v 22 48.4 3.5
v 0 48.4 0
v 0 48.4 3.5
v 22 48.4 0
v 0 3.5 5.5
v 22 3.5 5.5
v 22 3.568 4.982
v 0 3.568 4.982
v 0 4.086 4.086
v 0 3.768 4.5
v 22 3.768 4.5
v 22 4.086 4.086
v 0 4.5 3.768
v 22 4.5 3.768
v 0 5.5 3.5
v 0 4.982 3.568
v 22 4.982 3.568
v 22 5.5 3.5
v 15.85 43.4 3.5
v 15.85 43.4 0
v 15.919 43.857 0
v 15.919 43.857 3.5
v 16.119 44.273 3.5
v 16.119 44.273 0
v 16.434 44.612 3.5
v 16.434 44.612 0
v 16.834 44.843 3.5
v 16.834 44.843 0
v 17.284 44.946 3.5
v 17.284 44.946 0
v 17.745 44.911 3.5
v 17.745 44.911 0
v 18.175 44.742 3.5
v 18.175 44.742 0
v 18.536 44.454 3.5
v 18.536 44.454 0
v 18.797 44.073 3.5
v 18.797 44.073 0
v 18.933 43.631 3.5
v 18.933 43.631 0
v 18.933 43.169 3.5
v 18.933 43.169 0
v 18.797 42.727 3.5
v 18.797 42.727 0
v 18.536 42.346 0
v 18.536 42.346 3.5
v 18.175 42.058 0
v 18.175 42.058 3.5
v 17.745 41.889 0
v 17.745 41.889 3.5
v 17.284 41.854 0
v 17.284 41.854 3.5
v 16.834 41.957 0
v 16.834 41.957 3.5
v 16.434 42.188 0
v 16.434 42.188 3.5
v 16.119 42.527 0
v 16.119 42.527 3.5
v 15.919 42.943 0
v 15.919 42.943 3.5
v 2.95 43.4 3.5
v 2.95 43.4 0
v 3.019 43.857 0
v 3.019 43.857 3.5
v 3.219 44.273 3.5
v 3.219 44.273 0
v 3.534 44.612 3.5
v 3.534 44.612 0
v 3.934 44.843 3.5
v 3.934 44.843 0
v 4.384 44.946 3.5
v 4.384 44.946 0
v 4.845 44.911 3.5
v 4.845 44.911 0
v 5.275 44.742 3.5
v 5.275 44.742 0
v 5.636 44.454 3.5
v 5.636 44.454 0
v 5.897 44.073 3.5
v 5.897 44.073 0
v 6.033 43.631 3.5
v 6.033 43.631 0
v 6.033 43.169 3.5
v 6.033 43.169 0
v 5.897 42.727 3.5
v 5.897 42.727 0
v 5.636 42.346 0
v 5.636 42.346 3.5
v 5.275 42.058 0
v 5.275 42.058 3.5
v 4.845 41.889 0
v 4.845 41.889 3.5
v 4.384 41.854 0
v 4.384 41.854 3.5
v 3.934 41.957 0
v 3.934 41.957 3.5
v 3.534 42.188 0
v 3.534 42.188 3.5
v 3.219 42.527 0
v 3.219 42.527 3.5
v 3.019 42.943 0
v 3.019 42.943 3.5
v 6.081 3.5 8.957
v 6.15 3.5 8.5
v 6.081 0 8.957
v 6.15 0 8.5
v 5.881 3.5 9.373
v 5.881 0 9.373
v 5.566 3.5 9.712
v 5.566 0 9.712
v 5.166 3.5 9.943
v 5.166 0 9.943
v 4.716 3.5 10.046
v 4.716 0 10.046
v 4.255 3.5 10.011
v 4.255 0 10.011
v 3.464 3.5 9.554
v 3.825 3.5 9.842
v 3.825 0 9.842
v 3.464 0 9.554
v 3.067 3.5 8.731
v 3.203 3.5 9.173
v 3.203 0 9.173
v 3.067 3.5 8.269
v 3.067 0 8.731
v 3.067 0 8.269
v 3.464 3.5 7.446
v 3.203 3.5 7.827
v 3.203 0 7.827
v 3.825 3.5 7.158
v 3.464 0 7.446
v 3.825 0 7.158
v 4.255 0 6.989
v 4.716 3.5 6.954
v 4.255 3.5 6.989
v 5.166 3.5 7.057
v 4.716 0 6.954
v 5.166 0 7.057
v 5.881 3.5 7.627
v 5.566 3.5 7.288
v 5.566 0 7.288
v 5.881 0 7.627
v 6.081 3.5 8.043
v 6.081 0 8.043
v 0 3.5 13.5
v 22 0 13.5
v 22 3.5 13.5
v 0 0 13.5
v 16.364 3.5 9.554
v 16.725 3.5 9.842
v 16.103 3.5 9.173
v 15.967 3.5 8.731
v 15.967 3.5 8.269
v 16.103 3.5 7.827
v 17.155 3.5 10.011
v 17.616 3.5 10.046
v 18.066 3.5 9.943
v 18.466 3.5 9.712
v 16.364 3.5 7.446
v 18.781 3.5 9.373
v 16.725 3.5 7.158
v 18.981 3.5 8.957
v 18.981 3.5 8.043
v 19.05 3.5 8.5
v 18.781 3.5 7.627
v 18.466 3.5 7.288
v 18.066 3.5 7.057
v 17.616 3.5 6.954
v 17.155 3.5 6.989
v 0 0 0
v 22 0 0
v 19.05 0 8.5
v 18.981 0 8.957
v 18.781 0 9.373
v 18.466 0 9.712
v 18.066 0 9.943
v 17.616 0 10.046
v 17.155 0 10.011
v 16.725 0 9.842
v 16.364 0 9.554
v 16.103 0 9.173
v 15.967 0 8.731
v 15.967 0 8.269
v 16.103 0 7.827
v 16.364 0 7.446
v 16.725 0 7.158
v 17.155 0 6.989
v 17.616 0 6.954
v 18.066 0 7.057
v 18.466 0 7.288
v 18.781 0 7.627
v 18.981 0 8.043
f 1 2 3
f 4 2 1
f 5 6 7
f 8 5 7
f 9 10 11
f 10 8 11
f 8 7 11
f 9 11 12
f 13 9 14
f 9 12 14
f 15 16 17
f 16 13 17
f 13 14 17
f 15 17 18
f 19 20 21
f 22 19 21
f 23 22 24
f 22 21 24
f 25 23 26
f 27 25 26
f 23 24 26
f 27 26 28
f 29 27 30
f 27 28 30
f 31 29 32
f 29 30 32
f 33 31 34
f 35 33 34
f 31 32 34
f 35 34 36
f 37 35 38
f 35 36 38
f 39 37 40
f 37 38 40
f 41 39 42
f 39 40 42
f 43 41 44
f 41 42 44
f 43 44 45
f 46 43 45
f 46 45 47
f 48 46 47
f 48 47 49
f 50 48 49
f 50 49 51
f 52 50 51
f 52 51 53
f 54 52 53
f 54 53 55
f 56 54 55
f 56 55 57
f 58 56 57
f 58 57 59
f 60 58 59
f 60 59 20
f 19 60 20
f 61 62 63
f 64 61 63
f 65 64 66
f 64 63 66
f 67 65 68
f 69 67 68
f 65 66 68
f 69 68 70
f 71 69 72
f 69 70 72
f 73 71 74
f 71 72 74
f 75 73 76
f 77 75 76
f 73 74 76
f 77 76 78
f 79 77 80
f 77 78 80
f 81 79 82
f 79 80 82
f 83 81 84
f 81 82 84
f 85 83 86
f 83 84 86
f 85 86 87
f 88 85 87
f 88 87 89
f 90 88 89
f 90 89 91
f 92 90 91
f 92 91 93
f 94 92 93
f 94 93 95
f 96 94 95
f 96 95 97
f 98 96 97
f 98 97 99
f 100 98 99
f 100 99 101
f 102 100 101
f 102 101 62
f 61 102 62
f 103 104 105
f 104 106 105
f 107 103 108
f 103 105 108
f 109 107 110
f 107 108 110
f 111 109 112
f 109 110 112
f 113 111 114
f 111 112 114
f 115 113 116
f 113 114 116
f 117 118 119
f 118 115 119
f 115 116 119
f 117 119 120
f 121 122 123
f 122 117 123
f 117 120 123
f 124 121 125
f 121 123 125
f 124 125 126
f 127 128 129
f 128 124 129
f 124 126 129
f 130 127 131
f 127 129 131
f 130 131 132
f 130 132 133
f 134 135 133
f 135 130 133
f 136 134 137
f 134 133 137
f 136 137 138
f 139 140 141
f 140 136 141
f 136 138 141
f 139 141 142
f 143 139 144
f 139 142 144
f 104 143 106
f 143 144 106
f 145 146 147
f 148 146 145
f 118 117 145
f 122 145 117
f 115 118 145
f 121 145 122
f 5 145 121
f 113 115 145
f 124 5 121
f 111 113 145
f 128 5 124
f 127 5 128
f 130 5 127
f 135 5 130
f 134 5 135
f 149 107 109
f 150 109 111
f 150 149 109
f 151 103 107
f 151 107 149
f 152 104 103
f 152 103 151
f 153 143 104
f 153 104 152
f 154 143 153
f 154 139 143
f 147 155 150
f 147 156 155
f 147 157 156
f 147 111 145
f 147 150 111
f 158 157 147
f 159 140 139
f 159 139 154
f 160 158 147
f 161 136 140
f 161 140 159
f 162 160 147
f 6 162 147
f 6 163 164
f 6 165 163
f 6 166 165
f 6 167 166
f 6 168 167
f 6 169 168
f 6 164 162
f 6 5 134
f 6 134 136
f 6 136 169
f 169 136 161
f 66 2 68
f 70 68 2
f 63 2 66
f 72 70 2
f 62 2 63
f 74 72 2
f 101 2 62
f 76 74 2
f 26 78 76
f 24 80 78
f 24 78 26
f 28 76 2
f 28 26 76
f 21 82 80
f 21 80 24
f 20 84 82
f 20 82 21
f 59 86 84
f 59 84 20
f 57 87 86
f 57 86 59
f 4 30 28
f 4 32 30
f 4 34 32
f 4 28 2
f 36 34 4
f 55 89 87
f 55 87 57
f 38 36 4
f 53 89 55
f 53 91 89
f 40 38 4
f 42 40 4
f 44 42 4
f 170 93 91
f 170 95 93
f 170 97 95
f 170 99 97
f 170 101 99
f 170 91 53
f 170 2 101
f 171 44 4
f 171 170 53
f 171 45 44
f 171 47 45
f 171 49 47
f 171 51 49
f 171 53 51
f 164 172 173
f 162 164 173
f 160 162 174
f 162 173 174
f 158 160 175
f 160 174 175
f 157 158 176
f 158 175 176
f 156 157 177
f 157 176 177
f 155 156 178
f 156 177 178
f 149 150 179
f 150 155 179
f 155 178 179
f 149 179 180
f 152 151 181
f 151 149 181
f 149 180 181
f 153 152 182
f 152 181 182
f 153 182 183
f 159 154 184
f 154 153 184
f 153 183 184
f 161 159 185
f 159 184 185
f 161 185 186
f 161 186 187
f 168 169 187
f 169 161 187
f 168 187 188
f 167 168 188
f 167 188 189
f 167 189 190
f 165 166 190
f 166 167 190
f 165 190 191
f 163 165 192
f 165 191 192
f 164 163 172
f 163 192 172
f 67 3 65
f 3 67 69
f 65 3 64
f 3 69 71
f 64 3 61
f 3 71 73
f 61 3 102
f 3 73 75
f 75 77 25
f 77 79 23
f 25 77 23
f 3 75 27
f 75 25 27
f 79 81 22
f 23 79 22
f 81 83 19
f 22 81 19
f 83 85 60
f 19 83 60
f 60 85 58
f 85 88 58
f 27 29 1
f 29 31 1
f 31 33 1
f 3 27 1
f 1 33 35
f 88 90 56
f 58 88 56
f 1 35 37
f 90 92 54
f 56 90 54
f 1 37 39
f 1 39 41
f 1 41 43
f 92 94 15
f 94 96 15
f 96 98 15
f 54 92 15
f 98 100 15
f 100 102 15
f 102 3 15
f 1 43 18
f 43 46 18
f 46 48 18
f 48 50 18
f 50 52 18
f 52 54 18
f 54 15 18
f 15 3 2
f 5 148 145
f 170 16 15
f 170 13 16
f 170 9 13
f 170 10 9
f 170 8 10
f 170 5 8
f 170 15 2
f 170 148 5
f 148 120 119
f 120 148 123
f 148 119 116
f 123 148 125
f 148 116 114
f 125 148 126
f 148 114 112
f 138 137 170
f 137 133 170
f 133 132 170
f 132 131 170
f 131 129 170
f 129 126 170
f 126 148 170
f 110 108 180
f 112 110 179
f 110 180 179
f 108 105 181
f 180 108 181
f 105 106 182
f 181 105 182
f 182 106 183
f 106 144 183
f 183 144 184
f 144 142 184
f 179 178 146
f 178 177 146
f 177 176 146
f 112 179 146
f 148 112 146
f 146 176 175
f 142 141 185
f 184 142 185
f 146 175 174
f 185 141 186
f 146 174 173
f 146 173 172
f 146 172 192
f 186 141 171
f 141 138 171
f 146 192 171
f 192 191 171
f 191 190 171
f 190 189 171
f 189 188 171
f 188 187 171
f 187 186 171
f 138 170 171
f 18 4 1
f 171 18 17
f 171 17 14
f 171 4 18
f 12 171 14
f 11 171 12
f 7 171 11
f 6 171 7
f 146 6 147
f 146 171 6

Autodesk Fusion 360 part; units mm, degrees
sketch "Sketch1" plane through (0, 0, 0) normal (0, 1, 0) x (1, 0, 0)
  line L0 (0, 0) -> (22, 0)
  line L1 (22, 0) -> (22, -13.5)
  line L2 (22, -13.5) -> (0, -13.5)
  line L3 (0, -13.5) -> (0, 0)
  line L4 (0, -3.5) -> (22, -3.5)
  line L5 (0, -8.5) -> (22, -8.5) construction
  circle A0 centre (4.6, -8.5) radius 1.55
  circle A1 centre (17.5, -8.5) radius 1.55
  dimension "d1" = 22
  dimension "d2" = 13.5
  dimension "d3" = 3.5
  dimension "d4" = 5
  dimension "d5" = 3.1
  dimension "d6" = 3.1
  dimension "d7" = 12.9
  dimension "d8" = 4.5
extrude "Extrude1" add sketch "Sketch1" along normal blind 3.5 contours L1 L2 L3 L4
extrude "Extrude2" add sketch "Sketch1" along normal blind 48.4 contours L0 L1 L3 L4
sketch "Sketch2" plane through (0, 0, 0) normal (0, 0, -1) x (-1, 0, 0)
  line L0 (-22, 0) -> (0, 0)
  line L1 (0, 0) -> (0, 48.4)
  line L2 (0, 48.4) -> (-22, 48.4)
  line L3 (-22, 48.4) -> (-22, 0)
  line L4 (-22, 43.4) -> (0, 43.4) construction
  line L5 (0, 0) -> (-22, 0)
  circle A0 centre (-17.4, 43.4) radius 1.55
  circle A1 centre (-4.5, 43.4) radius 1.55
  dimension "d13" = 43.4
  dimension "d14" = 3.1
  dimension "d15" = 3.1
  dimension "d16" = 12.9
  dimension "d17" = 4.5
extrude "Extrude3" cut sketch "Sketch2" against normal up to surface (3.5 mm away) contours A0 | A1
fillet "Fillet1" radius 2 1 edges at (11, 3.5, 3.5)
